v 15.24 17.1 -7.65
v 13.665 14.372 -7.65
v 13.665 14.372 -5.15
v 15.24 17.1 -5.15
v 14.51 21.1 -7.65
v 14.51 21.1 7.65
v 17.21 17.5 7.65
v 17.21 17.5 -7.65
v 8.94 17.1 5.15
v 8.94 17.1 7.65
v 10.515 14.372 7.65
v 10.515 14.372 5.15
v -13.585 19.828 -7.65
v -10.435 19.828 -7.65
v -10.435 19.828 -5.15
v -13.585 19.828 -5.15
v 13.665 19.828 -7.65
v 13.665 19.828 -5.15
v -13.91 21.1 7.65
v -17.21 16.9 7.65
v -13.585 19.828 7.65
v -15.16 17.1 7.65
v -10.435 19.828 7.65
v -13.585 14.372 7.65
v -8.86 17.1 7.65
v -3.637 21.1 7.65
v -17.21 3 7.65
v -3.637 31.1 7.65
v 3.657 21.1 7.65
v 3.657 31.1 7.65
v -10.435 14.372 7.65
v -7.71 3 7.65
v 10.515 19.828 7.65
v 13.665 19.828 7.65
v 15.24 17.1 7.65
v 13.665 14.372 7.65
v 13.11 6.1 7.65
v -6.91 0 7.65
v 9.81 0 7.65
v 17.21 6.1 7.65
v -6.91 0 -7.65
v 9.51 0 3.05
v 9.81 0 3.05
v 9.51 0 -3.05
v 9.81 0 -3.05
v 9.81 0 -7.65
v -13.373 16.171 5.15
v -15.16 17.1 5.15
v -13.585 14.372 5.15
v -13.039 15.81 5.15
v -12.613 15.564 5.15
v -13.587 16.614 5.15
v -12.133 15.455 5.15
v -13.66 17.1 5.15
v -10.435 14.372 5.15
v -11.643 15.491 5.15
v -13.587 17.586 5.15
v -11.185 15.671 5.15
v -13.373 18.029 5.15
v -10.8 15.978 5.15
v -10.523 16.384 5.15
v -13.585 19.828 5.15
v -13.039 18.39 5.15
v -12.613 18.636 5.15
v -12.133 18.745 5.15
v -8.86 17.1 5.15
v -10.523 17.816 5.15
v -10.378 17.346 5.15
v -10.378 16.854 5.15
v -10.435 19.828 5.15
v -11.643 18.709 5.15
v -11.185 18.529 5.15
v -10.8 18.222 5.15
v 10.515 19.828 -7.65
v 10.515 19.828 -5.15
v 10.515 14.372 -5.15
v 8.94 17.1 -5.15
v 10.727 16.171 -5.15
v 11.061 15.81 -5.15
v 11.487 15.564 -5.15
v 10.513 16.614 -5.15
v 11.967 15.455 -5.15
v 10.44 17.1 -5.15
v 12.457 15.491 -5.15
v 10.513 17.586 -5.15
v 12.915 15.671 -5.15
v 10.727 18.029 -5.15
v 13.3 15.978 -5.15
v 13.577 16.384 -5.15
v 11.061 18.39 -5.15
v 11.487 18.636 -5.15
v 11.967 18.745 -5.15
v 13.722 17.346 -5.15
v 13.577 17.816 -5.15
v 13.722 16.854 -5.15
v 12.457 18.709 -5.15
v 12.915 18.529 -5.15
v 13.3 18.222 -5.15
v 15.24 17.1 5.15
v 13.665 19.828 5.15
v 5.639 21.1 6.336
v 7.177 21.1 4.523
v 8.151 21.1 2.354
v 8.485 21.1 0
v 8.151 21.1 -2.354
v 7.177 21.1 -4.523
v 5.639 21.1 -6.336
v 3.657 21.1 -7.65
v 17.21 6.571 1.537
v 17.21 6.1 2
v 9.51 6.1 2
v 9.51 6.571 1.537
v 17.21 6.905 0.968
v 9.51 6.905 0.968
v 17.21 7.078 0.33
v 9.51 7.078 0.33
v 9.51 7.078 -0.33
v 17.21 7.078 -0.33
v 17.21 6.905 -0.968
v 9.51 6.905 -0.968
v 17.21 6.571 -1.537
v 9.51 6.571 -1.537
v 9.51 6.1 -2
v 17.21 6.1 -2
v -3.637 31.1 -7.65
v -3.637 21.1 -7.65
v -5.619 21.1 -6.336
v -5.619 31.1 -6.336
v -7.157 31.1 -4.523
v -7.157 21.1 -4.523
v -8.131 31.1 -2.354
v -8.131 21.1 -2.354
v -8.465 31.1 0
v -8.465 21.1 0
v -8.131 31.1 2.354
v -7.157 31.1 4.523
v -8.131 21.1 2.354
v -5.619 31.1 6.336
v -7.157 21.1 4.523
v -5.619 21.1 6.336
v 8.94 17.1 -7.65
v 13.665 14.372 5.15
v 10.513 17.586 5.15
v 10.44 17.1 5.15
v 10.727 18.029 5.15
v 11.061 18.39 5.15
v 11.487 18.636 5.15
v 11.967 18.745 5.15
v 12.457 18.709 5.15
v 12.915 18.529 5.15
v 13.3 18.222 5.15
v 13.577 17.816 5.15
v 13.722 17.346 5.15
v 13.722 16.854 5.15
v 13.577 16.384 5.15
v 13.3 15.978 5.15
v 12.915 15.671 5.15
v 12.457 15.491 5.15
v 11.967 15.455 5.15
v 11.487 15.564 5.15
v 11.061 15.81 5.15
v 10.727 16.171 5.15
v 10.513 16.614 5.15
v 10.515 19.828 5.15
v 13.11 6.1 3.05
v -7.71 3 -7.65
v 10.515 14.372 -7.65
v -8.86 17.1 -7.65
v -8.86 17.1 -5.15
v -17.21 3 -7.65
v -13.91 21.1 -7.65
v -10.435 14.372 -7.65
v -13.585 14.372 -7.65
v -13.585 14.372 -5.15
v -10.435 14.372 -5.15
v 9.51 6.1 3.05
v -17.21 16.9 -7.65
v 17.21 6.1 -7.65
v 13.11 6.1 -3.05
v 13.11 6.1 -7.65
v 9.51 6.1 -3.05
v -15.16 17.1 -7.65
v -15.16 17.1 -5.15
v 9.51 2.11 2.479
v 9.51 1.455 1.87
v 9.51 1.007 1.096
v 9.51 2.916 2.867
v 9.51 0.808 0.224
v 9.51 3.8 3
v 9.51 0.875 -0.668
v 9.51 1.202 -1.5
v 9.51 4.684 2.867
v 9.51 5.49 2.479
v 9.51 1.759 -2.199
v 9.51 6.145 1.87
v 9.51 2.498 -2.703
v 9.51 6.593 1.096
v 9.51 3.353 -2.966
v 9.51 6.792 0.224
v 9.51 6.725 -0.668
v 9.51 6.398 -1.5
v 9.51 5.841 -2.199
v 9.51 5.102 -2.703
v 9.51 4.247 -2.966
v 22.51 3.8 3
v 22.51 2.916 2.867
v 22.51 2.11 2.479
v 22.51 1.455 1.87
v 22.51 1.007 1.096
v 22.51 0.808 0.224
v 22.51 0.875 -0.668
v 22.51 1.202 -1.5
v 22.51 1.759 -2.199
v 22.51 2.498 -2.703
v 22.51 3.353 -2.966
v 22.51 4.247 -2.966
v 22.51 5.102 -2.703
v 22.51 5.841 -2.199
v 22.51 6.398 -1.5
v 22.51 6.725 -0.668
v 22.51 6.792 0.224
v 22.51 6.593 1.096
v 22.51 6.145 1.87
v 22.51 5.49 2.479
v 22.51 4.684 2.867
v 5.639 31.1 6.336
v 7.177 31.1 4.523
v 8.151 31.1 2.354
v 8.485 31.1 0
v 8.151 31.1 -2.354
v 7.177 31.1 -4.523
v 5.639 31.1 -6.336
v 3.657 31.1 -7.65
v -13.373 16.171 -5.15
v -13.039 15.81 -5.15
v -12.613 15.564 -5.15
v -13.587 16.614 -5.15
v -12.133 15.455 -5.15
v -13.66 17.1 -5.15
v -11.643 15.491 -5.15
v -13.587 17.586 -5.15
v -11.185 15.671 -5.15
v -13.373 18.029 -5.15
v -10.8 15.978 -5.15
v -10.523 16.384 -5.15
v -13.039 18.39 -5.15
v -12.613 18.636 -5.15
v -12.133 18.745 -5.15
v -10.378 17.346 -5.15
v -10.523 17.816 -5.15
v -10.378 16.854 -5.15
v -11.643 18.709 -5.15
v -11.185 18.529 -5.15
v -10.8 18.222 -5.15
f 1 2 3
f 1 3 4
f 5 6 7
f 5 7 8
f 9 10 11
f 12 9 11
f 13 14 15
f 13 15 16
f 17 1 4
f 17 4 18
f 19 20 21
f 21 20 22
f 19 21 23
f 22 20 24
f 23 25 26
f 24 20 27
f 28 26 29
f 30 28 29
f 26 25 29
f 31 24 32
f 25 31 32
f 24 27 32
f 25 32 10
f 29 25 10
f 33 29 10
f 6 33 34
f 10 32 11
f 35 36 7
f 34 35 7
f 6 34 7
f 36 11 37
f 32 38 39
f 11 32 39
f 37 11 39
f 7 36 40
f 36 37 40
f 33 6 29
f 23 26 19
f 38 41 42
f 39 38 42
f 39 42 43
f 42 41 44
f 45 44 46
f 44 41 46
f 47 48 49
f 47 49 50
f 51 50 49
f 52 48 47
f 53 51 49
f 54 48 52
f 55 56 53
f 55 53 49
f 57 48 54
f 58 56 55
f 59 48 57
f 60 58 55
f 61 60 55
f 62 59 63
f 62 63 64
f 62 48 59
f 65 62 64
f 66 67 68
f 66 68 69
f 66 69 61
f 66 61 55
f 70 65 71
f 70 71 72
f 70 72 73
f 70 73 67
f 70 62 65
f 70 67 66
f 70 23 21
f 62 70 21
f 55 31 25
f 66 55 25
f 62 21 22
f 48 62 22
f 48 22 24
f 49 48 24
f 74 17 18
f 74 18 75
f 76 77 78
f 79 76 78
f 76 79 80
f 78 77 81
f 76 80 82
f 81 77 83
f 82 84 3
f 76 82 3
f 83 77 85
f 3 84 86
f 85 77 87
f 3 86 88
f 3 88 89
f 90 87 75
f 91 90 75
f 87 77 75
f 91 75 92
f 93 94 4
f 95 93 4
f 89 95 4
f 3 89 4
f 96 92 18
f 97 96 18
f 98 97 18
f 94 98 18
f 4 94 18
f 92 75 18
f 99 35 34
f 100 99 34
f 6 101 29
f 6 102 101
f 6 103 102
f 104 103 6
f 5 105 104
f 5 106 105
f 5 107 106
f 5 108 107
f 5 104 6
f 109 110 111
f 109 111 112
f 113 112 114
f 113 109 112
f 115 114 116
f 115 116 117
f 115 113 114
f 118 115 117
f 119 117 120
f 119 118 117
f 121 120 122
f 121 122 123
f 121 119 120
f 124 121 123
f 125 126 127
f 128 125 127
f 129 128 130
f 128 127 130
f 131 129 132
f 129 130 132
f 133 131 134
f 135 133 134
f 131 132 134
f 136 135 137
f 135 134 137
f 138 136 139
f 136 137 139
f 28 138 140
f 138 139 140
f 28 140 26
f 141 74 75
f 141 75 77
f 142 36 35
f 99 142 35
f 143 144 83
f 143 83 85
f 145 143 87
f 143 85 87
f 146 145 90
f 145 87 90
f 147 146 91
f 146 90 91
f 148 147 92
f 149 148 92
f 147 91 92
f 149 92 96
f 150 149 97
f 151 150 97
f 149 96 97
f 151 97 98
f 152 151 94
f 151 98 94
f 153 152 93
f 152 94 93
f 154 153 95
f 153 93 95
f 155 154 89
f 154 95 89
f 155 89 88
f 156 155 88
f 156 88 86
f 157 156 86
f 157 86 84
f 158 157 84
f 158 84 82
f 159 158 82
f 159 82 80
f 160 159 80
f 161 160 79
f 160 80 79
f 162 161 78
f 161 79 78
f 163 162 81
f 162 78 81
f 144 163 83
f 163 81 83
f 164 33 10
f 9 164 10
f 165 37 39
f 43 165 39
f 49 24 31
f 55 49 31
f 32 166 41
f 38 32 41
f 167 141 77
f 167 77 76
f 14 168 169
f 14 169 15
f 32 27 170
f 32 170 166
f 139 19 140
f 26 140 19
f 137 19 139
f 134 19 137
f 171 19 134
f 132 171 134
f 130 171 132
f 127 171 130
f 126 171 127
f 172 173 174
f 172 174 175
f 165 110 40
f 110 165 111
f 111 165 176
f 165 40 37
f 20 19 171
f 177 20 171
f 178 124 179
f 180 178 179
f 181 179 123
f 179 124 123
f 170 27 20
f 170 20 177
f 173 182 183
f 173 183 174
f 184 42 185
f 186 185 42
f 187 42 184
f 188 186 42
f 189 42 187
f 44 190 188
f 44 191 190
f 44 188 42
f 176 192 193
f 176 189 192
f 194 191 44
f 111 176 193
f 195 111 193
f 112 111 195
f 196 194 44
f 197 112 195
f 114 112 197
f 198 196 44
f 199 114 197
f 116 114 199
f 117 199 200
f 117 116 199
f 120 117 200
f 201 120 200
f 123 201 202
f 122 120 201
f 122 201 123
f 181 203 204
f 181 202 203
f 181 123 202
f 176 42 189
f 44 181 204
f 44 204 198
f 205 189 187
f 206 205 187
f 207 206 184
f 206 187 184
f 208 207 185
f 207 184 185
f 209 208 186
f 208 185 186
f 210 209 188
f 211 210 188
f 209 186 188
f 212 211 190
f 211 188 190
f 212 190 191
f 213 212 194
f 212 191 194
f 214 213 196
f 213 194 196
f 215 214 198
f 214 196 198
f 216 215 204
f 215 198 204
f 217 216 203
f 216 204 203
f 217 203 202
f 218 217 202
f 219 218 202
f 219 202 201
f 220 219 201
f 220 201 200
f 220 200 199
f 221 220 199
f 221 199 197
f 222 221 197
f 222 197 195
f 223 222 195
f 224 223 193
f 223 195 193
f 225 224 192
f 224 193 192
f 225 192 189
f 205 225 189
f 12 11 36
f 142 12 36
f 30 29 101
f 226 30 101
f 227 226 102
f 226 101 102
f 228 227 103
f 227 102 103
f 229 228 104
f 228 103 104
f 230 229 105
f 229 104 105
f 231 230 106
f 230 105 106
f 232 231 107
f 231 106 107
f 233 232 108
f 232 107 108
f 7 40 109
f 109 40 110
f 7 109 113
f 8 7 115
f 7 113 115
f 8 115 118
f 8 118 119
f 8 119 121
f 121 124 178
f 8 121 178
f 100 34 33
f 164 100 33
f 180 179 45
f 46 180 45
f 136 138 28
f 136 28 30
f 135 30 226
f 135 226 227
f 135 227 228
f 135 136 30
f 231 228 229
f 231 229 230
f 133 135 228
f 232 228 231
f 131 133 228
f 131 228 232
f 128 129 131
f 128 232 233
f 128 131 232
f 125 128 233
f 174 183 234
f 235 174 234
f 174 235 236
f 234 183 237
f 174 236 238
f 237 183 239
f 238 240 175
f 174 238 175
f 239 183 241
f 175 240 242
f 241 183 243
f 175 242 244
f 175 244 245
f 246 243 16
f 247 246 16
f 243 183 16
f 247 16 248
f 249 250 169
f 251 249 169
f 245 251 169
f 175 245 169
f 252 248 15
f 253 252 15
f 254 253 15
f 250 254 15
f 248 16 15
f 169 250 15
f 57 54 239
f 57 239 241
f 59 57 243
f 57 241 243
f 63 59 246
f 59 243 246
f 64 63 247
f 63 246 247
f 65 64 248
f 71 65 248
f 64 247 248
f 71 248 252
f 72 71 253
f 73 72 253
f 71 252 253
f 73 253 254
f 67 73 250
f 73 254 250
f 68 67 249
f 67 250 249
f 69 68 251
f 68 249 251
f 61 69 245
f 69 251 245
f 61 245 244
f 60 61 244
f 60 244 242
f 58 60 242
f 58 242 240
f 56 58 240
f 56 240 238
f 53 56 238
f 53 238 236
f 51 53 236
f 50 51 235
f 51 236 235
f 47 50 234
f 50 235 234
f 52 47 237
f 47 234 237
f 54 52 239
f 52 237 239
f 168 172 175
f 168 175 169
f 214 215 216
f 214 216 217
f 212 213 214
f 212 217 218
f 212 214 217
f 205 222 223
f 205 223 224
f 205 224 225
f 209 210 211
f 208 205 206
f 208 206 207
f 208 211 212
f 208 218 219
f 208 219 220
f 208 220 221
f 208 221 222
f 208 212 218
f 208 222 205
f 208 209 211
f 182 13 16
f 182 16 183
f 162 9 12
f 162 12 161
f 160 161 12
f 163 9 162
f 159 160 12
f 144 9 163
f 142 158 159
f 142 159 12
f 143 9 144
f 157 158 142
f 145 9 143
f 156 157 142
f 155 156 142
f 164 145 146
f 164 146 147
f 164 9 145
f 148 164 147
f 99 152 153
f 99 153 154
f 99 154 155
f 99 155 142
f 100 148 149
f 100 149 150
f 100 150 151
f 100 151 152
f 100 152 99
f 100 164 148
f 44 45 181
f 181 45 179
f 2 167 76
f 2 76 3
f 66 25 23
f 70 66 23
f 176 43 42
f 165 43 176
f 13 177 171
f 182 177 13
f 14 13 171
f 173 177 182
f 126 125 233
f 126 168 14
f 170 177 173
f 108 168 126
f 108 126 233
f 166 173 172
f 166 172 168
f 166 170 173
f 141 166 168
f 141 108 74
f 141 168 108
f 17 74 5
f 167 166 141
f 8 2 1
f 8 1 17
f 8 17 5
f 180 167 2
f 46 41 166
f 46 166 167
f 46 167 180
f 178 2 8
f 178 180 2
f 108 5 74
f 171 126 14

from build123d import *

# Parameters (mm, degrees)
SKETCH1_W                    = 34.42
SKETCH1_H                    = 15.3
BOSS_EXTRUDE1_DEPTH          = 21.1
CHAMFER1_SIZE                = 3.6
CHAMFER1_SIZE2               = 2.7
CHAMFER2_SIZE                = 4.2
CHAMFER2_SIZE2               = 3.3
CUT_EXTRUDE1_DEPTH           = 32.232740834
SKETCH3_R                    = 8.475
BOSS_EXTRUDE2_DEPTH          = 10
CUT_EXTRUDE2_REACH           = 30.517
F_0_15_0_15_DIAMETER_HOLE1_D = 3.3
F_0_15_0_15_DIAMETER_HOLE2_D = 3.3
CUT_EXTRUDE3_DEPTH           = 2.5
CUT_EXTRUDE4_START           = -15.3
CUT_EXTRUDE4_DEPTH           = 2.5
SKETCH10_W                   = 6.1
SKETCH10_H                   = 6.1
CUT_EXTRUDE5_DEPTH           = 7.7
CUT_EXTRUDE6_DEPTH           = 7.7
SKETCH12_R                   = 3
BOSS_EXTRUDE3_DEPTH          = 13


with BuildPart() as part:
    # Sketch1 → Boss-Extrude1 (new body)
    with BuildSketch(Plane(origin=(0, 0, 0), x_dir=(1, 0, 0), z_dir=(0, 1, 0))):
        Rectangle(SKETCH1_W, SKETCH1_H)
    extrude(amount=BOSS_EXTRUDE1_DEPTH)

    # Chamfer1
    chamfer1_edges = [part.edges().sort_by_distance(p)[0] for p in [
        (17.21, 21.1, 0),
    ]]
    chamfer1_side = [part.faces().sort_by_distance(p)[0] for p in [
        (17.21, 10.55, 0),
    ]]
    chamfer(chamfer1_edges, length=CHAMFER1_SIZE, length2=CHAMFER1_SIZE2, reference=chamfer1_side[0])

    # Chamfer2
    chamfer2_edges = [part.edges().sort_by_distance(p)[0] for p in [
        (-17.21, 21.1, 0),
    ]]
    chamfer2_side = [part.faces().sort_by_distance(p)[0] for p in [
        (-17.21, 10.55, 0),
    ]]
    chamfer(chamfer2_edges, length=CHAMFER2_SIZE, length2=CHAMFER2_SIZE2, reference=chamfer2_side[0])

    # Sketch2 → Cut-Extrude1 (cut, through all)
    with BuildSketch(Plane.XY.offset(7.65)):
        Polygon((-17.21, 3), (-7.71, 3), (-6.91, 0), (-17.21, 0), align=None)
        Polygon((17.21, 6.1), (13.11, 6.1), (9.81, 0), (17.21, 0), align=None)
    extrude(amount=-CUT_EXTRUDE1_DEPTH, mode=Mode.SUBTRACT)

    # Sketch3 → Boss-Extrude2 (add)
    with BuildSketch(Plane(origin=(0, 21.1, 0), x_dir=(1, 0, 0), z_dir=(0, 1, 0))):
        with Locations(Location((0.01, 0, 0), (0, 0, 64.509262206))):
            Circle(SKETCH3_R)
    extrude(amount=BOSS_EXTRUDE2_DEPTH)

    # Sketch4 → Cut-Extrude2 (cut, up to next)
    with BuildSketch(Plane.XZ.offset(-21.1), mode=Mode.PRIVATE) as cut_extrude2_sk1:
        with BuildLine():
            Line((-3.637344925, -7.65), (3.657344925, -7.65))
            ThreePointArc((3.657344925, -7.65), (0.01, -8.475), (-3.637344925, -7.65))
        make_face()
    cut_extrude2_tool1 = extrude(cut_extrude2_sk1.sketch, amount=-CUT_EXTRUDE2_REACH, mode=Mode.PRIVATE) & part.part
    # Sketch4 → Cut-Extrude2 (cut, up to next)
    with BuildSketch(Plane.XZ.offset(-21.1), mode=Mode.PRIVATE) as cut_extrude2_sk2:
        with BuildLine():
            Line((-3.637344925, 7.65), (3.657344925, 7.65))
            ThreePointArc((3.657344925, 7.65), (0.01, 8.475), (-3.637344925, 7.65))
        make_face()
    cut_extrude2_tool2 = extrude(cut_extrude2_sk2.sketch, amount=-CUT_EXTRUDE2_REACH, mode=Mode.PRIVATE) & part.part
    add(cut_extrude2_tool1.solids().sort_by_distance((0.01, 21.1, -7.981417))[0], mode=Mode.SUBTRACT)
    add(cut_extrude2_tool2.solids().sort_by_distance((0.01, 21.1, 7.981417))[0], mode=Mode.SUBTRACT)

    # Ø0.15 (0.15) Diameter Hole1 (through all)
    with Locations(Plane.XY.offset(7.65)):
        with Locations((-12.01, 17.1)):
            Hole(F_0_15_0_15_DIAMETER_HOLE1_D / 2)

    # Ø0.15 (0.15) Diameter Hole2 (through all)
    with Locations(Plane.XY.offset(7.65)):
        with Locations((12.09, 17.1)):
            Hole(F_0_15_0_15_DIAMETER_HOLE2_D / 2)

    # Sketch9 → Cut-Extrude3 (cut)
    with BuildSketch(Plane.XY.offset(7.65)):
        Polygon((8.94, 17.1), (10.515, 14.372019978), (13.665, 14.372019978), (15.24, 17.1), (13.665, 19.827980022), (10.515, 19.827980022), align=None)
        Polygon((-15.16, 17.1), (-13.585, 14.372019978), (-10.435, 14.372019978), (-8.86, 17.1), (-10.435, 19.827980022), (-13.585, 19.827980022), align=None)
    extrude(amount=-CUT_EXTRUDE3_DEPTH, mode=Mode.SUBTRACT)

    # Sketch9<2> → Cut-Extrude4 (cut)
    with BuildSketch(Plane.XY.offset(7.65).offset(CUT_EXTRUDE4_START)):
        Polygon((8.94, 17.1), (10.515, 14.372019978), (13.665, 14.372019978), (15.24, 17.1), (13.665, 19.827980022), (10.515, 19.827980022), align=None)
        Polygon((-15.16, 17.1), (-13.585, 14.372019978), (-10.435, 14.372019978), (-8.86, 17.1), (-10.435, 19.827980022), (-13.585, 19.827980022), align=None)
    extrude(amount=CUT_EXTRUDE4_DEPTH, mode=Mode.SUBTRACT)

    # Sketch10 → Cut-Extrude5 (cut)
    with BuildSketch(Plane(origin=(17.21, 0, 0), x_dir=(0, 0, -1), z_dir=(1, 0, 0))):
        with Locations((0, 3.05)):
            Rectangle(SKETCH10_W, SKETCH10_H)
    extrude(amount=-CUT_EXTRUDE5_DEPTH, mode=Mode.SUBTRACT)

    # Sketch11 → Cut-Extrude6 (cut)
    with BuildSketch(Plane(origin=(17.21, 0, 0), x_dir=(0, 0, -1), z_dir=(1, 0, 0))):
        with BuildLine():
            Line((2, 6.1), (-2, 6.1))
            ThreePointArc((-2, 6.1), (0, 7.1), (2, 6.1))
        make_face()
    extrude(amount=-CUT_EXTRUDE6_DEPTH, mode=Mode.SUBTRACT)

    # Sketch12 → Boss-Extrude3 (add)
    with BuildSketch(Plane(origin=(9.51, 0, 0), x_dir=(0, 0, -1), z_dir=(1, 0, 0))):
        with Locations(Location((0, 3.8, 0), (0, 0, 180))):
            Circle(SKETCH12_R)
    extrude(amount=BOSS_EXTRUDE3_DEPTH)


solid = part.part
